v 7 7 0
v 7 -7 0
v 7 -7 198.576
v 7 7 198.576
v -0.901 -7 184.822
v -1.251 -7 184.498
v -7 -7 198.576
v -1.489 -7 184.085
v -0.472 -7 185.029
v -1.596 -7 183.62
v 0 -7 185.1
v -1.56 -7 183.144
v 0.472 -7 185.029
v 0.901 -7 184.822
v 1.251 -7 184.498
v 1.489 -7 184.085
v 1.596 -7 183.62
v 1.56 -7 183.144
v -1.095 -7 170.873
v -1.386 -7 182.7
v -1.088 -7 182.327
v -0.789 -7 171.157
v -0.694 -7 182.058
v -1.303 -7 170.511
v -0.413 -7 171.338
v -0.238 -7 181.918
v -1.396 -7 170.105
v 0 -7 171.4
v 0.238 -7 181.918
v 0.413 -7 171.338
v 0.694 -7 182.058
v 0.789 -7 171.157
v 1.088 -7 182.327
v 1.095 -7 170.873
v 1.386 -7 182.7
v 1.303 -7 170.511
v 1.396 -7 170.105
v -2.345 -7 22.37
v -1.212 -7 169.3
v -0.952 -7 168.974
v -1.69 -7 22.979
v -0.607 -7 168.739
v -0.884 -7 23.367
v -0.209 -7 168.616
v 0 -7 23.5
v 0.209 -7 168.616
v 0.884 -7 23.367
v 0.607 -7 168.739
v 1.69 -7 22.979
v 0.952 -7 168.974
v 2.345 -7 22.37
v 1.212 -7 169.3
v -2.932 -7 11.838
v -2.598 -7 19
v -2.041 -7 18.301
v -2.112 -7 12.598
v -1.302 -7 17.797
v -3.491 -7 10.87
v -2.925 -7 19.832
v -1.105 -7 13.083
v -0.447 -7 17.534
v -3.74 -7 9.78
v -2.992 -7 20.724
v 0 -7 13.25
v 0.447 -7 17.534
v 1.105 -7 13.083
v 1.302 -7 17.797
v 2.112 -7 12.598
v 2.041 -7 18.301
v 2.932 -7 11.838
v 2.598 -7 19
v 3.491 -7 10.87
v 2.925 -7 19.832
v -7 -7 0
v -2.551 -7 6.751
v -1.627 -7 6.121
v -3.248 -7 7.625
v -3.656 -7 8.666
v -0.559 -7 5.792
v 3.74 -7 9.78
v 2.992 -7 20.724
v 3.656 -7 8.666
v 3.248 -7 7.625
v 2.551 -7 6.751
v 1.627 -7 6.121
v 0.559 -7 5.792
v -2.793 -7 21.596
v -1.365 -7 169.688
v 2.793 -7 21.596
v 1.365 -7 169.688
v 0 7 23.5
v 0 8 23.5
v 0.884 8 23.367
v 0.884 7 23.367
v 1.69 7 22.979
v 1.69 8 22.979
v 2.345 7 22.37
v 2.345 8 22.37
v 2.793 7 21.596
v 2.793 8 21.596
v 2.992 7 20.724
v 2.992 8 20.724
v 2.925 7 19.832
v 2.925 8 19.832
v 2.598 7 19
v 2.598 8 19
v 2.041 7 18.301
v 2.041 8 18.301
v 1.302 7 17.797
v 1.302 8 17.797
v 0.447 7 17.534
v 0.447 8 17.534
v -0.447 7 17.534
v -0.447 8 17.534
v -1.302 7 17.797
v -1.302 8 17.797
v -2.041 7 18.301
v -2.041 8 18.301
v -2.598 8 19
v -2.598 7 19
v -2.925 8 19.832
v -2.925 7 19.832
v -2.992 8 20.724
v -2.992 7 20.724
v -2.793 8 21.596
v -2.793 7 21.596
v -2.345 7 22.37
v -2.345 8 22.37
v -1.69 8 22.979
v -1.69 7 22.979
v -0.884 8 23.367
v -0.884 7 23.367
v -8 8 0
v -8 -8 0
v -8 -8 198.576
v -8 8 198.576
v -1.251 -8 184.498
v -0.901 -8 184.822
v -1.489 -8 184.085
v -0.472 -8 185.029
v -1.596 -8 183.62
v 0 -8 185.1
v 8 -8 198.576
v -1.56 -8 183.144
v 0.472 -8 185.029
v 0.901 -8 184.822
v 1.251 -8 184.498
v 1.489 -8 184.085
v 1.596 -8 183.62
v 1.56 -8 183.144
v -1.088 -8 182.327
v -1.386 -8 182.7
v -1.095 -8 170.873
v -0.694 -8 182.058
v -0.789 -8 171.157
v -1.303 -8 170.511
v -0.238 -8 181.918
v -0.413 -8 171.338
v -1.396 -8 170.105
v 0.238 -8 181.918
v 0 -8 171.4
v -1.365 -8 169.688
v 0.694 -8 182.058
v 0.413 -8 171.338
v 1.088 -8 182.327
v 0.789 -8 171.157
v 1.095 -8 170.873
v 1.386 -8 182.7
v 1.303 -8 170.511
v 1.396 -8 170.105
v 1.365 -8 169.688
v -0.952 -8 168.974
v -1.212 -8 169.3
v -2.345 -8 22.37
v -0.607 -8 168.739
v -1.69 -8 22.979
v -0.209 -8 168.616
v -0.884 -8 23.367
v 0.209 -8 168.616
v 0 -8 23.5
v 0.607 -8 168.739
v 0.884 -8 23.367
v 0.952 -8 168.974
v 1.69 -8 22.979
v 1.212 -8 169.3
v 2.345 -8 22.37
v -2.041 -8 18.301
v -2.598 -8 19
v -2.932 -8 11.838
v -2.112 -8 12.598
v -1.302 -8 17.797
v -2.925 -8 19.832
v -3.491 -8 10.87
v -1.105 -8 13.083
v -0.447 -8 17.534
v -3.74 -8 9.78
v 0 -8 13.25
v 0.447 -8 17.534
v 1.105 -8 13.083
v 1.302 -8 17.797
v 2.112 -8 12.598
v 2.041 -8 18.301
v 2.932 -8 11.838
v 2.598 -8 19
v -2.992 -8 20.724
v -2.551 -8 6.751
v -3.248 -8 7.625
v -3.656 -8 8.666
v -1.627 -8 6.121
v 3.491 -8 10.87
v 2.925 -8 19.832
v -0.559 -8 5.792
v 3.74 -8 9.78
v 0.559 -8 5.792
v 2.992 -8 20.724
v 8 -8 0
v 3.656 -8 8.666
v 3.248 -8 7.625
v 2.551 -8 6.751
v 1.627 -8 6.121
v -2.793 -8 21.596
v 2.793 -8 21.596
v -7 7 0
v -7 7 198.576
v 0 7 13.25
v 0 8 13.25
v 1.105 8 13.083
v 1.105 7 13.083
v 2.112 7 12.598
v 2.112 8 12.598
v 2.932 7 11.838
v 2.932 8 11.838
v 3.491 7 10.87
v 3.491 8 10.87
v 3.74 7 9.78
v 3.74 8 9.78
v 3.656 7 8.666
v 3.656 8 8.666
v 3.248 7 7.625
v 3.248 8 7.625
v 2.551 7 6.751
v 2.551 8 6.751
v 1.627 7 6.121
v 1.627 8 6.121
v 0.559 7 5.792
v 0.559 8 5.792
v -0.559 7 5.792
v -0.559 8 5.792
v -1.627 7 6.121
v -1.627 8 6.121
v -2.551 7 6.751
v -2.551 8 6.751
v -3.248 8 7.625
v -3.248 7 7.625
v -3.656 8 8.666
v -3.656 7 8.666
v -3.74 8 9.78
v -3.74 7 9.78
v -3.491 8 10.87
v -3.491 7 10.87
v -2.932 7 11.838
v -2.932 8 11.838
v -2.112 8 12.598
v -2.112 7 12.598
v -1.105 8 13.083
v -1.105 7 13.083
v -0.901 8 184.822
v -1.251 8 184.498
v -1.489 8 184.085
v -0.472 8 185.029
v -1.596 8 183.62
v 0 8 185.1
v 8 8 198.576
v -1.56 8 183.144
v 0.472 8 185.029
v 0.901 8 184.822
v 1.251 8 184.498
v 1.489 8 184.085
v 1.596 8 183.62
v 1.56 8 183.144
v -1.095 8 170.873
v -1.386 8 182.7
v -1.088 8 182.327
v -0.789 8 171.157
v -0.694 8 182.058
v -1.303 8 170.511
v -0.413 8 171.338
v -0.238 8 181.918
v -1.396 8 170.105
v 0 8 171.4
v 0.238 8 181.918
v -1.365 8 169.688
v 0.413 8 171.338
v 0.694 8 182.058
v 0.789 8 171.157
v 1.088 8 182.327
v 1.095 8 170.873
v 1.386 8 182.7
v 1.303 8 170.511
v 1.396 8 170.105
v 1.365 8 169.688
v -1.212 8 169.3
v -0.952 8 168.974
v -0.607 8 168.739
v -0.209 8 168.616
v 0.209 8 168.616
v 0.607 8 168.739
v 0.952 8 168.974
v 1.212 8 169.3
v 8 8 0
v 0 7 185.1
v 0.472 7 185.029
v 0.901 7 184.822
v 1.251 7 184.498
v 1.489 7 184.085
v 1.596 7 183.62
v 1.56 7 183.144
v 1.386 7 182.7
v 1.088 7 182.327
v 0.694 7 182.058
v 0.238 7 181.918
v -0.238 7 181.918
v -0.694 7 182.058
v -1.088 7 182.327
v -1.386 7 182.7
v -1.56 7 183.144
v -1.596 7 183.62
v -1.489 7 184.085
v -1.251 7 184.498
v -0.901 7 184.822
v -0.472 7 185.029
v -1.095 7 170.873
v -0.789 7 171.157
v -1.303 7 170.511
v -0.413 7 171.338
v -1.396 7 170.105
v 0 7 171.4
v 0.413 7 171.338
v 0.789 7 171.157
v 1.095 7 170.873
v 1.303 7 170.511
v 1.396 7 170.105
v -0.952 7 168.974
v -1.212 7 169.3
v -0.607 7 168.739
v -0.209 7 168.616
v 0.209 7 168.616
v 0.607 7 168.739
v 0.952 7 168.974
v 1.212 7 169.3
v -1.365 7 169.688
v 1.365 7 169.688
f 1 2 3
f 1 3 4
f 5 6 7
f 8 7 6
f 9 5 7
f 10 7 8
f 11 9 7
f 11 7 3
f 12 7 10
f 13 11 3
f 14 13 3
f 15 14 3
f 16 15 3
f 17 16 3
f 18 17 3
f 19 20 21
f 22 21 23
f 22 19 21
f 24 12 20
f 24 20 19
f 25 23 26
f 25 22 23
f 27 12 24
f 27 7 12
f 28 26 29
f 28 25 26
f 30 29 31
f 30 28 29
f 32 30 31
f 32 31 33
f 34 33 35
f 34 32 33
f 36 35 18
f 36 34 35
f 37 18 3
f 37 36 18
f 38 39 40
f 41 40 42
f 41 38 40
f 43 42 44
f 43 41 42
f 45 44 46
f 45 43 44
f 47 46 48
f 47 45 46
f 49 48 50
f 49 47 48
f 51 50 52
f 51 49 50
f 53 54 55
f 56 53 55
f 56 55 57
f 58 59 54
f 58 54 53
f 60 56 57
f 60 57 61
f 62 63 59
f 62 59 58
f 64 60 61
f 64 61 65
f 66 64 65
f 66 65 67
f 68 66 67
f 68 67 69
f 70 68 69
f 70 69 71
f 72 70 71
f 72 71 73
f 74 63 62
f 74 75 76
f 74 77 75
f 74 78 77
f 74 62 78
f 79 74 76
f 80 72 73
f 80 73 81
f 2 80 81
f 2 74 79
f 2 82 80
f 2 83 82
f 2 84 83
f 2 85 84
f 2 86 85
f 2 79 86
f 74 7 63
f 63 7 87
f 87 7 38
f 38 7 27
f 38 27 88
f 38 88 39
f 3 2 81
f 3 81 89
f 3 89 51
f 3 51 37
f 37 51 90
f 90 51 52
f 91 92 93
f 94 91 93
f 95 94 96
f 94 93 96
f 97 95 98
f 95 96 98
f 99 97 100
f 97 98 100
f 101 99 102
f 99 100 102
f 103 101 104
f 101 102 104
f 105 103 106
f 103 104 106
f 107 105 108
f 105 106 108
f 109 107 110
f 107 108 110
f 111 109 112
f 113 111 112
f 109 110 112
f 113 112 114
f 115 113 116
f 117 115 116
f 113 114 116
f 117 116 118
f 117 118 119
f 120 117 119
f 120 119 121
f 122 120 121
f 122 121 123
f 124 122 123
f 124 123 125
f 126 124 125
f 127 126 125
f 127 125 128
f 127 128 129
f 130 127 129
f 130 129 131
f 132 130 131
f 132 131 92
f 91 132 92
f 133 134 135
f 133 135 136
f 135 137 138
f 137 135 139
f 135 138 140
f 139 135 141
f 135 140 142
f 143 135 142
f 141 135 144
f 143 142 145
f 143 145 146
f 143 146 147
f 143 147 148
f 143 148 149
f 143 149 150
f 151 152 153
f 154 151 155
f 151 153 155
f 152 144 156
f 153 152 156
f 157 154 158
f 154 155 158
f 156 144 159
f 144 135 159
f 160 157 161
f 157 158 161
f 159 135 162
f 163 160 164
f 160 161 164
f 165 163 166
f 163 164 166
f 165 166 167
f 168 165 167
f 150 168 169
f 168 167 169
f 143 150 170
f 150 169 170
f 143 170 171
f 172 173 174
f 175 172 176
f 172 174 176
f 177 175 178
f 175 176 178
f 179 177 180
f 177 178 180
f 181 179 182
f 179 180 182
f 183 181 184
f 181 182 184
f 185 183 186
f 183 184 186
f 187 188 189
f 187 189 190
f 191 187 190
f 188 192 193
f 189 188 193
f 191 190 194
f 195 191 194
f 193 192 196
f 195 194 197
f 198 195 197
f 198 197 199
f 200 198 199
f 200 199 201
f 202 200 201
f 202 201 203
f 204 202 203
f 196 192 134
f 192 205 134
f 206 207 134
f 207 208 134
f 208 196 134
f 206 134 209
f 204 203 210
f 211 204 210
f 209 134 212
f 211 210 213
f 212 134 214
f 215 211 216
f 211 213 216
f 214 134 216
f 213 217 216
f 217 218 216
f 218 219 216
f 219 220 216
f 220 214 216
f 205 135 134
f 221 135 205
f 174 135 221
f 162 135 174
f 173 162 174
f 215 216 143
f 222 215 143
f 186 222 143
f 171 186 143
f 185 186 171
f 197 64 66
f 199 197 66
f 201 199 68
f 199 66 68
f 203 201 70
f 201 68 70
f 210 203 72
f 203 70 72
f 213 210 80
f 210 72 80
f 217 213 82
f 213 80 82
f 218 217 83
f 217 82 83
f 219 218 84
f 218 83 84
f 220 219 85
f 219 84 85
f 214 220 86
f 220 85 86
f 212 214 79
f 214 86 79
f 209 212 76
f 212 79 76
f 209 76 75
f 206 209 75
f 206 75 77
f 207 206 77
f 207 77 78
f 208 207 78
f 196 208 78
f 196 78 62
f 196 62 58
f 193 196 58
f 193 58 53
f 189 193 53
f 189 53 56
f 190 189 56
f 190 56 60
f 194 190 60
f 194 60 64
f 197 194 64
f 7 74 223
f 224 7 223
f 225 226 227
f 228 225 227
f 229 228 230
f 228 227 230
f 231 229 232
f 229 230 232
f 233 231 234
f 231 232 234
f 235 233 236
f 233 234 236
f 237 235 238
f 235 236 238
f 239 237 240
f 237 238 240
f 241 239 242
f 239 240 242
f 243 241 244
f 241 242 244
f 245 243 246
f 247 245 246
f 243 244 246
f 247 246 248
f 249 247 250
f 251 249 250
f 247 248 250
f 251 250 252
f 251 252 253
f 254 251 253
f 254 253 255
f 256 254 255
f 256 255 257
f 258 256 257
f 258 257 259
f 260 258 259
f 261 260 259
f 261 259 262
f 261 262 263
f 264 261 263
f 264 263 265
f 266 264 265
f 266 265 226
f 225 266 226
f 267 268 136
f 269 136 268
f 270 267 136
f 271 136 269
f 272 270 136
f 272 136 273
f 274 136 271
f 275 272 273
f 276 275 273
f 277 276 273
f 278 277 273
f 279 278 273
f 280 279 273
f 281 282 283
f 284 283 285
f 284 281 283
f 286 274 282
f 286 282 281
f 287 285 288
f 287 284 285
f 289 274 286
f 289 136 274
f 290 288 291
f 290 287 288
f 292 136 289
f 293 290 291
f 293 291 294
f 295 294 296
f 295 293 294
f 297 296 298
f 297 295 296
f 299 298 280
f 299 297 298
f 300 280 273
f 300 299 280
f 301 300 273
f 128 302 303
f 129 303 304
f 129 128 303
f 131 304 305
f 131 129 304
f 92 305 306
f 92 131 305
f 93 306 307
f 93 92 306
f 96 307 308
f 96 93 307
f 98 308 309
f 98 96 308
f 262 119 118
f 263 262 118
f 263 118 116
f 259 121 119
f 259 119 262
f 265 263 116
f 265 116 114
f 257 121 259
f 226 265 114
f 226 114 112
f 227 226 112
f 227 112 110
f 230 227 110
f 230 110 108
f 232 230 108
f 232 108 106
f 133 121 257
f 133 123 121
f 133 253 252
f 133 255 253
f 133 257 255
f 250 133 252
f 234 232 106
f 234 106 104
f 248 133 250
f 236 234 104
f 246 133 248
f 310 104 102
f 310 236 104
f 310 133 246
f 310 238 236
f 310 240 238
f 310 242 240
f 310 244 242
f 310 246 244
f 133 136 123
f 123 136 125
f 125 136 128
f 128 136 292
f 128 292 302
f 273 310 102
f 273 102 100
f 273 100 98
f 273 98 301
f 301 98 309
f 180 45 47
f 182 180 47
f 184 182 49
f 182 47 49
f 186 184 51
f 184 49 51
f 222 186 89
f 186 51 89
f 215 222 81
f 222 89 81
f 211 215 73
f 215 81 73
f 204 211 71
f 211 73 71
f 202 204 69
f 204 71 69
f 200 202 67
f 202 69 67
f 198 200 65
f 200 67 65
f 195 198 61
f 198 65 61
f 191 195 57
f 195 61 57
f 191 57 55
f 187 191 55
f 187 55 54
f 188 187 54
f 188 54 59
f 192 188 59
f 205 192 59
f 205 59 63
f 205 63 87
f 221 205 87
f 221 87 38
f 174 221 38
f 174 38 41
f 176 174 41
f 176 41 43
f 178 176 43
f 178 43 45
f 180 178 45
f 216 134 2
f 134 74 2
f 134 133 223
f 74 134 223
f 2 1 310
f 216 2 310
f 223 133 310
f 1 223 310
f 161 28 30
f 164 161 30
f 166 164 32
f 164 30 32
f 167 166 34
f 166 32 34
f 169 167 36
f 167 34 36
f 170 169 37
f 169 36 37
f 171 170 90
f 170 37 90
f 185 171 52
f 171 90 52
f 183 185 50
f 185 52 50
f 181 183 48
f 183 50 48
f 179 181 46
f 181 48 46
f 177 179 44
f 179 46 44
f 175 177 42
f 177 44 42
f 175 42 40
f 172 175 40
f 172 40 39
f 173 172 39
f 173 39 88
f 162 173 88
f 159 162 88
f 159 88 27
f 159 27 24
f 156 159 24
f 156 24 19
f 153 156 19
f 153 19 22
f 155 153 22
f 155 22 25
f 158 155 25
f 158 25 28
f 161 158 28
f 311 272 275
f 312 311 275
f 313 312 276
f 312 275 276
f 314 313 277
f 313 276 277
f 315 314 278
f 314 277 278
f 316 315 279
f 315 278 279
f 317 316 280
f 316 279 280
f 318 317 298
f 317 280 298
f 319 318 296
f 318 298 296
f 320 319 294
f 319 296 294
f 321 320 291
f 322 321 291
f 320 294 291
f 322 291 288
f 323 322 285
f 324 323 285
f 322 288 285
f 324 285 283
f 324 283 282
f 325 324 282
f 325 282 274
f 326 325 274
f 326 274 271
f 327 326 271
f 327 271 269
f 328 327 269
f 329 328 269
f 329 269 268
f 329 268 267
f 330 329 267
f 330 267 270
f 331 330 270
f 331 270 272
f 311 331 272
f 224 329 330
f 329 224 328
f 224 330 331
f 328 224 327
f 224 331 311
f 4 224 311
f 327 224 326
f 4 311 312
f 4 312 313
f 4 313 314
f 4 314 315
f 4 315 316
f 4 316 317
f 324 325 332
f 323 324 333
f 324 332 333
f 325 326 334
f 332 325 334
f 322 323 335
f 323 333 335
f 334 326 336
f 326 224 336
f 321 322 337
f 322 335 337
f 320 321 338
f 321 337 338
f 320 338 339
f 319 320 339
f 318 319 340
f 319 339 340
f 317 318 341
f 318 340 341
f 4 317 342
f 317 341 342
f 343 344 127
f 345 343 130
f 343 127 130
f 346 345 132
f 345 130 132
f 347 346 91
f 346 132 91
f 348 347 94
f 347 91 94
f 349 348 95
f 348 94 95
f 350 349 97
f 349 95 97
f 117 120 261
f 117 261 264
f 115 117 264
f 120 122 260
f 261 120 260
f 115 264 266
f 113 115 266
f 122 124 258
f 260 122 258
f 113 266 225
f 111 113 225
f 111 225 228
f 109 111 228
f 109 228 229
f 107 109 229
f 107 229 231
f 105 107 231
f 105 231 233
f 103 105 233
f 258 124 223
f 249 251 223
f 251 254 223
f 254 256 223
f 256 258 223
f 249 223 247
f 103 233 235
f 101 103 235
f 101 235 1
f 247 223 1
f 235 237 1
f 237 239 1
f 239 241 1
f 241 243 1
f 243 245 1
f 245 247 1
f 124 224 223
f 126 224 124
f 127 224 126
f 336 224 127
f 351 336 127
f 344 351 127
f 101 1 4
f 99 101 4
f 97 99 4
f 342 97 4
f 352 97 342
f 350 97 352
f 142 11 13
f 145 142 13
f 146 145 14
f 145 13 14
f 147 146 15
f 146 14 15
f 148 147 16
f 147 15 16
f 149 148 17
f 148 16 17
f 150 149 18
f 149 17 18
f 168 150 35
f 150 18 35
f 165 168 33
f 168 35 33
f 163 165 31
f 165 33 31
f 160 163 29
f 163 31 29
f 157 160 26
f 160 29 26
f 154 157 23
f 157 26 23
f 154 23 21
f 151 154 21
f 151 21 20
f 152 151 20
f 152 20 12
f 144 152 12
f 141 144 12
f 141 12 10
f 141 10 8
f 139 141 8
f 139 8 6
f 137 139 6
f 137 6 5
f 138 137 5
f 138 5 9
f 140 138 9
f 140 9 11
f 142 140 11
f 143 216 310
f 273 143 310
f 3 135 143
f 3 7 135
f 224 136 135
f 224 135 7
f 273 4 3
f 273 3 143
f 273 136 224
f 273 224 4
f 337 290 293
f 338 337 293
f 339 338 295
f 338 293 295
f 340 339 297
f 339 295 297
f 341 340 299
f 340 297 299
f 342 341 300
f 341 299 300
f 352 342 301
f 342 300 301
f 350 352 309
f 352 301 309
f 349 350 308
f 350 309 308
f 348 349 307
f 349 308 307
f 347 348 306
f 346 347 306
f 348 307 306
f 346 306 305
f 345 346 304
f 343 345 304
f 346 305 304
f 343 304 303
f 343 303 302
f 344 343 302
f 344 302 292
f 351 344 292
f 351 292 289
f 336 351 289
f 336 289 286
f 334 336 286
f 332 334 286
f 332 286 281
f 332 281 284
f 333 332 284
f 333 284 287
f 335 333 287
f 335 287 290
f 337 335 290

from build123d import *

# Parameters (mm, degrees)
SKETCH1_W           = 16
SKETCH1_H           = 16
SKETCH1_W_2         = 14
SKETCH1_H_2         = 14
BOSS_EXTRUDE1_DEPTH = 198.575758147
SKETCH2_R           = 3.75
SKETCH2_R_2         = 3
SKETCH2_R_3         = 1.4
SKETCH2_R_4         = 1.6
CUT_EXTRUDE1_DEPTH  = 200.3798679


with BuildPart() as part:
    # Sketch1 → Boss-Extrude1 (new body)
    with BuildSketch(Plane.XY):
        Rectangle(SKETCH1_W, SKETCH1_H)
        Rectangle(SKETCH1_W_2, SKETCH1_H_2, mode=Mode.SUBTRACT)
    extrude(amount=BOSS_EXTRUDE1_DEPTH)

    # Sketch2 → Cut-Extrude1 (cut, through all)
    with BuildSketch(Plane(origin=(0, 8, 0), x_dir=(1, 0, 0), z_dir=(0, 1, 0))):
        with Locations(Location((0, -9.5, 0), (0, 0, 270))):
            Circle(SKETCH2_R)
        with Locations(Location((0, -20.5, 0), (0, 0, 270))):
            Circle(SKETCH2_R_2)
        with Locations(Location((0, -170, 0), (0, 0, 270))):
            Circle(SKETCH2_R_3)
        with Locations(Location((0, -183.5, 0), (0, 0, 270))):
            Circle(SKETCH2_R_4)
    extrude(amount=-CUT_EXTRUDE1_DEPTH, mode=Mode.SUBTRACT)


solid = part.part
